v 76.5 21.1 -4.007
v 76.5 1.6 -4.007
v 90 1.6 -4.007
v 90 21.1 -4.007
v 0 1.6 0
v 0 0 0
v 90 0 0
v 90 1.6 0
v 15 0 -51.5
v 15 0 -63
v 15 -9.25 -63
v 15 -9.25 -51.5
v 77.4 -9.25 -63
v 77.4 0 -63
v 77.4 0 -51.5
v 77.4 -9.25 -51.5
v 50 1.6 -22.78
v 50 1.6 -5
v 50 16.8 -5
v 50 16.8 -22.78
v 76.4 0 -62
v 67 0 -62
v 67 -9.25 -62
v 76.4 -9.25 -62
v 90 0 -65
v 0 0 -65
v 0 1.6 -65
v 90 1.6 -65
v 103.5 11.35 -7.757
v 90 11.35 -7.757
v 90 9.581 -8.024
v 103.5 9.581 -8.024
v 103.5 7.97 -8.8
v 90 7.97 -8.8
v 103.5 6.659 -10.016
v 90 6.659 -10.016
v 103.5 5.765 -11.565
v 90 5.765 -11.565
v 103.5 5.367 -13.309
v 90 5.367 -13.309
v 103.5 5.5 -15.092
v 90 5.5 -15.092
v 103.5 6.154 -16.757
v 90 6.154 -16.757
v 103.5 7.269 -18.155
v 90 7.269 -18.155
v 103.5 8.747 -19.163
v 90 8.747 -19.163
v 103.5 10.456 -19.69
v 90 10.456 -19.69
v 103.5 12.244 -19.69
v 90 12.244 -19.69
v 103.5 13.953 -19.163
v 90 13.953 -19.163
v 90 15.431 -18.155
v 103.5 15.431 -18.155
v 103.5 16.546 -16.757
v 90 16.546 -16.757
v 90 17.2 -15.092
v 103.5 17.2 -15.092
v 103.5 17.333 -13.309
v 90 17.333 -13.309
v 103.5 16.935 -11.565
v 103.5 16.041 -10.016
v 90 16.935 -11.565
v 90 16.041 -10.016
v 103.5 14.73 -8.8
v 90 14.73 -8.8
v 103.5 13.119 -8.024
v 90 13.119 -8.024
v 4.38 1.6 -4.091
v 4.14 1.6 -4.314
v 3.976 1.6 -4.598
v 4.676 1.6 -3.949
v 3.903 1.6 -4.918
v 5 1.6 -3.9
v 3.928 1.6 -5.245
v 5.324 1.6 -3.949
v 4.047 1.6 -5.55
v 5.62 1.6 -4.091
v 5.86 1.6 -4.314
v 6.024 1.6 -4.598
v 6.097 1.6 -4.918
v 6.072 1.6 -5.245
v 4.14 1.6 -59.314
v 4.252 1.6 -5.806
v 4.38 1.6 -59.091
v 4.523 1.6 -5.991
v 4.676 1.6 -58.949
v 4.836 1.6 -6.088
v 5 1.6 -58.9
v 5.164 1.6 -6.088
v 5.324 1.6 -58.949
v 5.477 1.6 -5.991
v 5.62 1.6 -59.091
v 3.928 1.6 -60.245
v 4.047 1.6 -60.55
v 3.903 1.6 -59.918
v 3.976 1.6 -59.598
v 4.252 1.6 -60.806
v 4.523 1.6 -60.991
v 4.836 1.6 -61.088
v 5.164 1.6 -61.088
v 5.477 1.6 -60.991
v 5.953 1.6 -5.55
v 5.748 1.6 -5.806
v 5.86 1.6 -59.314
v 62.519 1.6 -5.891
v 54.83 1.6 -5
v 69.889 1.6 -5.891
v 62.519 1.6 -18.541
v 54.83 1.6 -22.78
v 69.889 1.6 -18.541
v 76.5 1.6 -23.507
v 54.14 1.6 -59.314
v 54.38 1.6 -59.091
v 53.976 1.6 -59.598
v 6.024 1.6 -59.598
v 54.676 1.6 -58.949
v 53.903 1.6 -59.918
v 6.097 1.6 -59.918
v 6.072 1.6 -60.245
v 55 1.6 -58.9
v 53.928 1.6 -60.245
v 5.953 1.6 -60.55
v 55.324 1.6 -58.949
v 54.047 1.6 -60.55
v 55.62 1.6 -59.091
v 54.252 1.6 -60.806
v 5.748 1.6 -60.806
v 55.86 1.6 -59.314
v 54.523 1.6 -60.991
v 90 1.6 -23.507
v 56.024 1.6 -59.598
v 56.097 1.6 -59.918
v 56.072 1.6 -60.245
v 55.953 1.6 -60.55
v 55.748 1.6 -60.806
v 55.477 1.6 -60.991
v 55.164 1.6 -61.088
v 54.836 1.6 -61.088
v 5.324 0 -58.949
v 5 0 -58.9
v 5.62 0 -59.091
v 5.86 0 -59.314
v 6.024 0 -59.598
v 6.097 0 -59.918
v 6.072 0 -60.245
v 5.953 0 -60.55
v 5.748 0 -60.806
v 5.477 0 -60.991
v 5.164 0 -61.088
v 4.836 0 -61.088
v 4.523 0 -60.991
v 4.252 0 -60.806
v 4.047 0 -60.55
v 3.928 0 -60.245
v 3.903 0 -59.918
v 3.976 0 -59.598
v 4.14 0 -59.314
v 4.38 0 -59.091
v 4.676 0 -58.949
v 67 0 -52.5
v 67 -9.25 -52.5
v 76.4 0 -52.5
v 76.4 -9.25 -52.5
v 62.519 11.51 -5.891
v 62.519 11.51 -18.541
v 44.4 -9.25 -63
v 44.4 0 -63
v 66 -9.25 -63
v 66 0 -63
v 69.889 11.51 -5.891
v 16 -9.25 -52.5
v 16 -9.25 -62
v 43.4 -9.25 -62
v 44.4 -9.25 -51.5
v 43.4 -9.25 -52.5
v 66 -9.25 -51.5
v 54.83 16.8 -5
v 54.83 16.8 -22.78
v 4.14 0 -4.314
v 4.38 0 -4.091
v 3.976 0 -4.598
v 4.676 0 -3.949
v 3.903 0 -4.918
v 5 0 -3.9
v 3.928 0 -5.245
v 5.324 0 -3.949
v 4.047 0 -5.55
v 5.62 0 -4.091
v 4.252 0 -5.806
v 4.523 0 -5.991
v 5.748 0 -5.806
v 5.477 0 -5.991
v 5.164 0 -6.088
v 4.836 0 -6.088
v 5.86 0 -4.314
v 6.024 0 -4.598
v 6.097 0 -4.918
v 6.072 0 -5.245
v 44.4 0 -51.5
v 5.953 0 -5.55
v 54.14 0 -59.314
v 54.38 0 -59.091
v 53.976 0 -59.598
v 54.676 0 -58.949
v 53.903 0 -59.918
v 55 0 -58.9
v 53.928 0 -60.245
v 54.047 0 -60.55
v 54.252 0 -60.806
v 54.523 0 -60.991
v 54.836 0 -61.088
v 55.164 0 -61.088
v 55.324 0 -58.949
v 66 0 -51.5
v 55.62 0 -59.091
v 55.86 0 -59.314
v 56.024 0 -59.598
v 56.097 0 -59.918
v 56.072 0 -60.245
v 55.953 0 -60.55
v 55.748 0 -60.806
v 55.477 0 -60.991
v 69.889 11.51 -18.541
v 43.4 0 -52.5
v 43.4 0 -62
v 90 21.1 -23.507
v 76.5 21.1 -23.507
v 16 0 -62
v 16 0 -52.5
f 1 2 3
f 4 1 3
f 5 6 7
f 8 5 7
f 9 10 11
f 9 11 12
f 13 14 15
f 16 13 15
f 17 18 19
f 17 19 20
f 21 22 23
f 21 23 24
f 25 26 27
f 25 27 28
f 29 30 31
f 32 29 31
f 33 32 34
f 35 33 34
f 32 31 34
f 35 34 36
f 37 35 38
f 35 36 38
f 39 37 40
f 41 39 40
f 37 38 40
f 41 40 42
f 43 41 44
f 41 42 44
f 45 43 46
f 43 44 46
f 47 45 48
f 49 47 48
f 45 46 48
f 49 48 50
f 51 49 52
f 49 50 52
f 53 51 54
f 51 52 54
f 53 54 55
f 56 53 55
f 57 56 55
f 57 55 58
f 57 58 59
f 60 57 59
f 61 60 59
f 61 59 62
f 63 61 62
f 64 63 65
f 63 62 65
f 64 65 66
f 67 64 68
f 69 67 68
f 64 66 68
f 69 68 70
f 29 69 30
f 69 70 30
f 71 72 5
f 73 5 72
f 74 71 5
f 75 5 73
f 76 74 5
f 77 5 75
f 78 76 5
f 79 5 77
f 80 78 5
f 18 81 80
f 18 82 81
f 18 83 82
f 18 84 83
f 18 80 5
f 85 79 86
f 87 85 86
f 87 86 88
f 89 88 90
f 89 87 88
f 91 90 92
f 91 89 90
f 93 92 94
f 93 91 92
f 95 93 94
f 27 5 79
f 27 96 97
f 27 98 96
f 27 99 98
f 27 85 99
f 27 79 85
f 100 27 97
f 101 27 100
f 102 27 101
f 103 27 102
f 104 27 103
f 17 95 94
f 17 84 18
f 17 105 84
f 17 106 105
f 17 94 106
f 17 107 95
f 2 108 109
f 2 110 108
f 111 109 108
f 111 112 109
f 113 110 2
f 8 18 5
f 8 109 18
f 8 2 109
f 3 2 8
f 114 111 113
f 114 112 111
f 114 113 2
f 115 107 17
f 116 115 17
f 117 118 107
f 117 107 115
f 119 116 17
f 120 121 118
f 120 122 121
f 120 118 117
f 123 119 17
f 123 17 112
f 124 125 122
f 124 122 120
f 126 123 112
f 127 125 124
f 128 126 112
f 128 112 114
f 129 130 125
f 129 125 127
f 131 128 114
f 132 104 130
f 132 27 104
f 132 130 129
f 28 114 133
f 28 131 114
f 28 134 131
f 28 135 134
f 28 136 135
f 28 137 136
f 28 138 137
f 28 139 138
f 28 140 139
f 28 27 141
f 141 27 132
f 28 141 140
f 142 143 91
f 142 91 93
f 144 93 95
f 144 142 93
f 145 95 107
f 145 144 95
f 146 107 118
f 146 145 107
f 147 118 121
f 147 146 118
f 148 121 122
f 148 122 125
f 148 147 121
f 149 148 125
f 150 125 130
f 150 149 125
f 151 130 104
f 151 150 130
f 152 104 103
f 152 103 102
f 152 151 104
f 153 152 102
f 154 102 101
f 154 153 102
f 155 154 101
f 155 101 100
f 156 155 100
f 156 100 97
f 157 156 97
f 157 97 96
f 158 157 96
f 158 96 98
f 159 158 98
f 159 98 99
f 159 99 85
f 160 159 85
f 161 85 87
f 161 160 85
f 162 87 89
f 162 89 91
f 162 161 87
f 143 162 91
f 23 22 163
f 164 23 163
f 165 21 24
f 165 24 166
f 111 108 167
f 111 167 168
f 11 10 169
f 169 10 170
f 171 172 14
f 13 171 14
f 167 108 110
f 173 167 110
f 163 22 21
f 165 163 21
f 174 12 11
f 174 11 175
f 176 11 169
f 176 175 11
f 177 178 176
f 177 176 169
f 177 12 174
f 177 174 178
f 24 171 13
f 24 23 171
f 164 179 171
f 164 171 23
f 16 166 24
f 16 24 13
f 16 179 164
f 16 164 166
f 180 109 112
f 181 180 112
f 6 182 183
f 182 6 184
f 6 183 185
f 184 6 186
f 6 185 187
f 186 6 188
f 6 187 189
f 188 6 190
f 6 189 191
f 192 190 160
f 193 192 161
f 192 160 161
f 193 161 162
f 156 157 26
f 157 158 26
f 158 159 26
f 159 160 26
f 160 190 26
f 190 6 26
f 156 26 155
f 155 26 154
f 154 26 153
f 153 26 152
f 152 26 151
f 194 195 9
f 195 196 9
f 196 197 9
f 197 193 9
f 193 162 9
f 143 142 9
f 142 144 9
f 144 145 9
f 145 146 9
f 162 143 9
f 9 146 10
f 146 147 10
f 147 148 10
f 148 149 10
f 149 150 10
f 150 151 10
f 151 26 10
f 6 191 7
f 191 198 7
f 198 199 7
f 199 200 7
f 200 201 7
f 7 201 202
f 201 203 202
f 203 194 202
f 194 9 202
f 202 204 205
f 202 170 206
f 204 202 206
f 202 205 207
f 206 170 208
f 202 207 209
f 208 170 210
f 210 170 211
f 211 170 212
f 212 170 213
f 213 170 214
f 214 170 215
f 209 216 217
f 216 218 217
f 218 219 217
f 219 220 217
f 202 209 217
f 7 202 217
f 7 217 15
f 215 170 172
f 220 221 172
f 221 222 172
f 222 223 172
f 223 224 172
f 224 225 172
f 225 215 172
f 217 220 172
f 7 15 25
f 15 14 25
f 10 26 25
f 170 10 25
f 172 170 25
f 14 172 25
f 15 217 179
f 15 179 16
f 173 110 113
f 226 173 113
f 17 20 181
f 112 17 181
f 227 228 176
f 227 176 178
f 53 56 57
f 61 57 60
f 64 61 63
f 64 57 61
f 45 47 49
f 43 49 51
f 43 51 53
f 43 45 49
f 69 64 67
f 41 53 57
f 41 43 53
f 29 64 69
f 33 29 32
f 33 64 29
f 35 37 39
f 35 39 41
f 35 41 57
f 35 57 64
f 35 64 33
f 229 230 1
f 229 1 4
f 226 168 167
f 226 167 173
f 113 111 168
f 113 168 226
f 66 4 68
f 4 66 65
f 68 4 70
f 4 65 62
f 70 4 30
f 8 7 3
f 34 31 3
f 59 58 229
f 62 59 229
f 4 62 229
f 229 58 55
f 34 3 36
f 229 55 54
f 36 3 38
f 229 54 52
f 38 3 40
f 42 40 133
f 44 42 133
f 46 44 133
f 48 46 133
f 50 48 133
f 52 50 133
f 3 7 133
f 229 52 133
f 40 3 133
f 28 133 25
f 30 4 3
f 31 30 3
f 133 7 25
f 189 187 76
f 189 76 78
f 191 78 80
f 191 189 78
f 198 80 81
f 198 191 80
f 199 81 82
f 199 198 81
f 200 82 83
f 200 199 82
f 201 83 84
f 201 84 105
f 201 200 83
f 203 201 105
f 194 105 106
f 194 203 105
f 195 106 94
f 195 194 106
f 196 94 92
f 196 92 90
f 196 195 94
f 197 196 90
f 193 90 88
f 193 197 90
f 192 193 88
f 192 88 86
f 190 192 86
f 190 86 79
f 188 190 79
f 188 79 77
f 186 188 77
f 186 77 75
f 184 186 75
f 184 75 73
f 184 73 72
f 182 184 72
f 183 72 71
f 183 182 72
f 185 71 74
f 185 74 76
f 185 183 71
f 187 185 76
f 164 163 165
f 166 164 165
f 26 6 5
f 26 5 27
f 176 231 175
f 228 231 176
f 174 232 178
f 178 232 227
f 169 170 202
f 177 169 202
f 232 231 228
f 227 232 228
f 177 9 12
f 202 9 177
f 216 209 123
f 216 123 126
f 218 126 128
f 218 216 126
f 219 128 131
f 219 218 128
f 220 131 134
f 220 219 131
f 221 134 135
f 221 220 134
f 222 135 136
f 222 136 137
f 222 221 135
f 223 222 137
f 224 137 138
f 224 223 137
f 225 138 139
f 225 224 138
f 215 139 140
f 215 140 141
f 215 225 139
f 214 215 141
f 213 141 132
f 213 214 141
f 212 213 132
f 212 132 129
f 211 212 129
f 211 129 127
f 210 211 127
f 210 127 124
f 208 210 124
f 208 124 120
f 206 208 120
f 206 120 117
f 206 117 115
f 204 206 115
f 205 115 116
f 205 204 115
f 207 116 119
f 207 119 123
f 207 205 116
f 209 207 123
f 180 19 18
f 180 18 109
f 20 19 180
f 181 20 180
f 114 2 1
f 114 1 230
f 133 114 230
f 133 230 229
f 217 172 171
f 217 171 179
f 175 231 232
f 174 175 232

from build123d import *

# Parameters (mm, degrees)
SKETCH1_W                            = 90
SKETCH1_H                            = 65
SKETCH1_R                            = 1.1
BOSS_EXTRUDE1_DEPTH                  = 1.6
SKETCH2_W                            = 29.4
SKETCH2_H                            = 11.5
SKETCH2_W_2                          = 27.4
SKETCH2_H_2                          = 9.5
SKETCH2_W_3                          = 11.4
SKETCH2_W_4                          = 9.4
CELL_AND_THERMISTOR_CONNECTORS_DEPTH = 9.25
SKETCH3_W                            = 13.5
SKETCH3_H                            = 19.5
BOSS_EXTRUDE2_DEPTH                  = 19.5
SKETCH4_R                            = 6
BOSS_EXTRUDE3_DEPTH                  = 13.5
SKETCH5_W                            = 4.83
SKETCH5_H                            = 17.78
JTAG_HEADER_DEPTH                    = 15.2
SKETCH6_W                            = 7.37
SKETCH6_H                            = 12.65
AUX_CAN_HEADER_DEPTH                 = 9.91


with BuildPart() as part:
    # Sketch1 → Boss-Extrude1 (new body)
    with BuildSketch(Plane(origin=(0, 0, 0), x_dir=(1, 0, 0), z_dir=(0, 1, 0))):
        with Locations((45, 32.5)):
            Rectangle(SKETCH1_W, SKETCH1_H)
        with Locations((5, 5)):
            Circle(SKETCH1_R, mode=Mode.SUBTRACT)
        with Locations((5, 60)):
            Circle(SKETCH1_R, mode=Mode.SUBTRACT)
        with Locations((55, 60)):
            Circle(SKETCH1_R, mode=Mode.SUBTRACT)
    extrude(amount=BOSS_EXTRUDE1_DEPTH)

    # Sketch2 → Cell and thermistor connectors (add)
    # profile 1 of 2: a face of its own
    with BuildSketch(Plane.XZ):
        with Locations((29.7, -57.25)):
            Rectangle(SKETCH2_W, SKETCH2_H)
        with Locations((29.7, -57.25)):
            Rectangle(SKETCH2_W_2, SKETCH2_H_2, mode=Mode.SUBTRACT)
    # profile 2 of 2: a face of its own
    with BuildSketch(Plane.XZ):
        with Locations((71.7, -57.25)):
            Rectangle(SKETCH2_W_3, SKETCH2_H)
        with Locations((71.7, -57.25)):
            Rectangle(SKETCH2_W_4, SKETCH2_H_2, mode=Mode.SUBTRACT)
    extrude(amount=CELL_AND_THERMISTOR_CONNECTORS_DEPTH)

    # Sketch3 → Boss-Extrude2 (add)
    with BuildSketch(Plane(origin=(0, 1.6, 0), x_dir=(1, 0, 0), z_dir=(0, 1, 0))):
        with Locations((83.25, 13.757121209)):
            Rectangle(SKETCH3_W, SKETCH3_H)
    extrude(amount=BOSS_EXTRUDE2_DEPTH)

    # Sketch4 → Boss-Extrude3 (add)
    with BuildSketch(Plane(origin=(90, 0, 0), x_dir=(0, 0, -1), z_dir=(1, 0, 0))):
        with Locations((13.757121209, 11.35)):
            Circle(SKETCH4_R)
    extrude(amount=BOSS_EXTRUDE3_DEPTH)

    # Sketch5 → JTAG header (add)
    with BuildSketch(Plane(origin=(0, 1.6, 0), x_dir=(1, 0, 0), z_dir=(0, 1, 0))):
        with Locations((52.415, 13.89)):
            Rectangle(SKETCH5_W, SKETCH5_H)
    extrude(amount=JTAG_HEADER_DEPTH)

    # Sketch6 → Aux. CAN header (add)
    with BuildSketch(Plane(origin=(0, 1.6, 0), x_dir=(1, 0, 0), z_dir=(0, 1, 0))):
        with Locations((66.203516114, 12.216109448)):
            Rectangle(SKETCH6_W, SKETCH6_H)
    extrude(amount=AUX_CAN_HEADER_DEPTH)


solid = part.part
